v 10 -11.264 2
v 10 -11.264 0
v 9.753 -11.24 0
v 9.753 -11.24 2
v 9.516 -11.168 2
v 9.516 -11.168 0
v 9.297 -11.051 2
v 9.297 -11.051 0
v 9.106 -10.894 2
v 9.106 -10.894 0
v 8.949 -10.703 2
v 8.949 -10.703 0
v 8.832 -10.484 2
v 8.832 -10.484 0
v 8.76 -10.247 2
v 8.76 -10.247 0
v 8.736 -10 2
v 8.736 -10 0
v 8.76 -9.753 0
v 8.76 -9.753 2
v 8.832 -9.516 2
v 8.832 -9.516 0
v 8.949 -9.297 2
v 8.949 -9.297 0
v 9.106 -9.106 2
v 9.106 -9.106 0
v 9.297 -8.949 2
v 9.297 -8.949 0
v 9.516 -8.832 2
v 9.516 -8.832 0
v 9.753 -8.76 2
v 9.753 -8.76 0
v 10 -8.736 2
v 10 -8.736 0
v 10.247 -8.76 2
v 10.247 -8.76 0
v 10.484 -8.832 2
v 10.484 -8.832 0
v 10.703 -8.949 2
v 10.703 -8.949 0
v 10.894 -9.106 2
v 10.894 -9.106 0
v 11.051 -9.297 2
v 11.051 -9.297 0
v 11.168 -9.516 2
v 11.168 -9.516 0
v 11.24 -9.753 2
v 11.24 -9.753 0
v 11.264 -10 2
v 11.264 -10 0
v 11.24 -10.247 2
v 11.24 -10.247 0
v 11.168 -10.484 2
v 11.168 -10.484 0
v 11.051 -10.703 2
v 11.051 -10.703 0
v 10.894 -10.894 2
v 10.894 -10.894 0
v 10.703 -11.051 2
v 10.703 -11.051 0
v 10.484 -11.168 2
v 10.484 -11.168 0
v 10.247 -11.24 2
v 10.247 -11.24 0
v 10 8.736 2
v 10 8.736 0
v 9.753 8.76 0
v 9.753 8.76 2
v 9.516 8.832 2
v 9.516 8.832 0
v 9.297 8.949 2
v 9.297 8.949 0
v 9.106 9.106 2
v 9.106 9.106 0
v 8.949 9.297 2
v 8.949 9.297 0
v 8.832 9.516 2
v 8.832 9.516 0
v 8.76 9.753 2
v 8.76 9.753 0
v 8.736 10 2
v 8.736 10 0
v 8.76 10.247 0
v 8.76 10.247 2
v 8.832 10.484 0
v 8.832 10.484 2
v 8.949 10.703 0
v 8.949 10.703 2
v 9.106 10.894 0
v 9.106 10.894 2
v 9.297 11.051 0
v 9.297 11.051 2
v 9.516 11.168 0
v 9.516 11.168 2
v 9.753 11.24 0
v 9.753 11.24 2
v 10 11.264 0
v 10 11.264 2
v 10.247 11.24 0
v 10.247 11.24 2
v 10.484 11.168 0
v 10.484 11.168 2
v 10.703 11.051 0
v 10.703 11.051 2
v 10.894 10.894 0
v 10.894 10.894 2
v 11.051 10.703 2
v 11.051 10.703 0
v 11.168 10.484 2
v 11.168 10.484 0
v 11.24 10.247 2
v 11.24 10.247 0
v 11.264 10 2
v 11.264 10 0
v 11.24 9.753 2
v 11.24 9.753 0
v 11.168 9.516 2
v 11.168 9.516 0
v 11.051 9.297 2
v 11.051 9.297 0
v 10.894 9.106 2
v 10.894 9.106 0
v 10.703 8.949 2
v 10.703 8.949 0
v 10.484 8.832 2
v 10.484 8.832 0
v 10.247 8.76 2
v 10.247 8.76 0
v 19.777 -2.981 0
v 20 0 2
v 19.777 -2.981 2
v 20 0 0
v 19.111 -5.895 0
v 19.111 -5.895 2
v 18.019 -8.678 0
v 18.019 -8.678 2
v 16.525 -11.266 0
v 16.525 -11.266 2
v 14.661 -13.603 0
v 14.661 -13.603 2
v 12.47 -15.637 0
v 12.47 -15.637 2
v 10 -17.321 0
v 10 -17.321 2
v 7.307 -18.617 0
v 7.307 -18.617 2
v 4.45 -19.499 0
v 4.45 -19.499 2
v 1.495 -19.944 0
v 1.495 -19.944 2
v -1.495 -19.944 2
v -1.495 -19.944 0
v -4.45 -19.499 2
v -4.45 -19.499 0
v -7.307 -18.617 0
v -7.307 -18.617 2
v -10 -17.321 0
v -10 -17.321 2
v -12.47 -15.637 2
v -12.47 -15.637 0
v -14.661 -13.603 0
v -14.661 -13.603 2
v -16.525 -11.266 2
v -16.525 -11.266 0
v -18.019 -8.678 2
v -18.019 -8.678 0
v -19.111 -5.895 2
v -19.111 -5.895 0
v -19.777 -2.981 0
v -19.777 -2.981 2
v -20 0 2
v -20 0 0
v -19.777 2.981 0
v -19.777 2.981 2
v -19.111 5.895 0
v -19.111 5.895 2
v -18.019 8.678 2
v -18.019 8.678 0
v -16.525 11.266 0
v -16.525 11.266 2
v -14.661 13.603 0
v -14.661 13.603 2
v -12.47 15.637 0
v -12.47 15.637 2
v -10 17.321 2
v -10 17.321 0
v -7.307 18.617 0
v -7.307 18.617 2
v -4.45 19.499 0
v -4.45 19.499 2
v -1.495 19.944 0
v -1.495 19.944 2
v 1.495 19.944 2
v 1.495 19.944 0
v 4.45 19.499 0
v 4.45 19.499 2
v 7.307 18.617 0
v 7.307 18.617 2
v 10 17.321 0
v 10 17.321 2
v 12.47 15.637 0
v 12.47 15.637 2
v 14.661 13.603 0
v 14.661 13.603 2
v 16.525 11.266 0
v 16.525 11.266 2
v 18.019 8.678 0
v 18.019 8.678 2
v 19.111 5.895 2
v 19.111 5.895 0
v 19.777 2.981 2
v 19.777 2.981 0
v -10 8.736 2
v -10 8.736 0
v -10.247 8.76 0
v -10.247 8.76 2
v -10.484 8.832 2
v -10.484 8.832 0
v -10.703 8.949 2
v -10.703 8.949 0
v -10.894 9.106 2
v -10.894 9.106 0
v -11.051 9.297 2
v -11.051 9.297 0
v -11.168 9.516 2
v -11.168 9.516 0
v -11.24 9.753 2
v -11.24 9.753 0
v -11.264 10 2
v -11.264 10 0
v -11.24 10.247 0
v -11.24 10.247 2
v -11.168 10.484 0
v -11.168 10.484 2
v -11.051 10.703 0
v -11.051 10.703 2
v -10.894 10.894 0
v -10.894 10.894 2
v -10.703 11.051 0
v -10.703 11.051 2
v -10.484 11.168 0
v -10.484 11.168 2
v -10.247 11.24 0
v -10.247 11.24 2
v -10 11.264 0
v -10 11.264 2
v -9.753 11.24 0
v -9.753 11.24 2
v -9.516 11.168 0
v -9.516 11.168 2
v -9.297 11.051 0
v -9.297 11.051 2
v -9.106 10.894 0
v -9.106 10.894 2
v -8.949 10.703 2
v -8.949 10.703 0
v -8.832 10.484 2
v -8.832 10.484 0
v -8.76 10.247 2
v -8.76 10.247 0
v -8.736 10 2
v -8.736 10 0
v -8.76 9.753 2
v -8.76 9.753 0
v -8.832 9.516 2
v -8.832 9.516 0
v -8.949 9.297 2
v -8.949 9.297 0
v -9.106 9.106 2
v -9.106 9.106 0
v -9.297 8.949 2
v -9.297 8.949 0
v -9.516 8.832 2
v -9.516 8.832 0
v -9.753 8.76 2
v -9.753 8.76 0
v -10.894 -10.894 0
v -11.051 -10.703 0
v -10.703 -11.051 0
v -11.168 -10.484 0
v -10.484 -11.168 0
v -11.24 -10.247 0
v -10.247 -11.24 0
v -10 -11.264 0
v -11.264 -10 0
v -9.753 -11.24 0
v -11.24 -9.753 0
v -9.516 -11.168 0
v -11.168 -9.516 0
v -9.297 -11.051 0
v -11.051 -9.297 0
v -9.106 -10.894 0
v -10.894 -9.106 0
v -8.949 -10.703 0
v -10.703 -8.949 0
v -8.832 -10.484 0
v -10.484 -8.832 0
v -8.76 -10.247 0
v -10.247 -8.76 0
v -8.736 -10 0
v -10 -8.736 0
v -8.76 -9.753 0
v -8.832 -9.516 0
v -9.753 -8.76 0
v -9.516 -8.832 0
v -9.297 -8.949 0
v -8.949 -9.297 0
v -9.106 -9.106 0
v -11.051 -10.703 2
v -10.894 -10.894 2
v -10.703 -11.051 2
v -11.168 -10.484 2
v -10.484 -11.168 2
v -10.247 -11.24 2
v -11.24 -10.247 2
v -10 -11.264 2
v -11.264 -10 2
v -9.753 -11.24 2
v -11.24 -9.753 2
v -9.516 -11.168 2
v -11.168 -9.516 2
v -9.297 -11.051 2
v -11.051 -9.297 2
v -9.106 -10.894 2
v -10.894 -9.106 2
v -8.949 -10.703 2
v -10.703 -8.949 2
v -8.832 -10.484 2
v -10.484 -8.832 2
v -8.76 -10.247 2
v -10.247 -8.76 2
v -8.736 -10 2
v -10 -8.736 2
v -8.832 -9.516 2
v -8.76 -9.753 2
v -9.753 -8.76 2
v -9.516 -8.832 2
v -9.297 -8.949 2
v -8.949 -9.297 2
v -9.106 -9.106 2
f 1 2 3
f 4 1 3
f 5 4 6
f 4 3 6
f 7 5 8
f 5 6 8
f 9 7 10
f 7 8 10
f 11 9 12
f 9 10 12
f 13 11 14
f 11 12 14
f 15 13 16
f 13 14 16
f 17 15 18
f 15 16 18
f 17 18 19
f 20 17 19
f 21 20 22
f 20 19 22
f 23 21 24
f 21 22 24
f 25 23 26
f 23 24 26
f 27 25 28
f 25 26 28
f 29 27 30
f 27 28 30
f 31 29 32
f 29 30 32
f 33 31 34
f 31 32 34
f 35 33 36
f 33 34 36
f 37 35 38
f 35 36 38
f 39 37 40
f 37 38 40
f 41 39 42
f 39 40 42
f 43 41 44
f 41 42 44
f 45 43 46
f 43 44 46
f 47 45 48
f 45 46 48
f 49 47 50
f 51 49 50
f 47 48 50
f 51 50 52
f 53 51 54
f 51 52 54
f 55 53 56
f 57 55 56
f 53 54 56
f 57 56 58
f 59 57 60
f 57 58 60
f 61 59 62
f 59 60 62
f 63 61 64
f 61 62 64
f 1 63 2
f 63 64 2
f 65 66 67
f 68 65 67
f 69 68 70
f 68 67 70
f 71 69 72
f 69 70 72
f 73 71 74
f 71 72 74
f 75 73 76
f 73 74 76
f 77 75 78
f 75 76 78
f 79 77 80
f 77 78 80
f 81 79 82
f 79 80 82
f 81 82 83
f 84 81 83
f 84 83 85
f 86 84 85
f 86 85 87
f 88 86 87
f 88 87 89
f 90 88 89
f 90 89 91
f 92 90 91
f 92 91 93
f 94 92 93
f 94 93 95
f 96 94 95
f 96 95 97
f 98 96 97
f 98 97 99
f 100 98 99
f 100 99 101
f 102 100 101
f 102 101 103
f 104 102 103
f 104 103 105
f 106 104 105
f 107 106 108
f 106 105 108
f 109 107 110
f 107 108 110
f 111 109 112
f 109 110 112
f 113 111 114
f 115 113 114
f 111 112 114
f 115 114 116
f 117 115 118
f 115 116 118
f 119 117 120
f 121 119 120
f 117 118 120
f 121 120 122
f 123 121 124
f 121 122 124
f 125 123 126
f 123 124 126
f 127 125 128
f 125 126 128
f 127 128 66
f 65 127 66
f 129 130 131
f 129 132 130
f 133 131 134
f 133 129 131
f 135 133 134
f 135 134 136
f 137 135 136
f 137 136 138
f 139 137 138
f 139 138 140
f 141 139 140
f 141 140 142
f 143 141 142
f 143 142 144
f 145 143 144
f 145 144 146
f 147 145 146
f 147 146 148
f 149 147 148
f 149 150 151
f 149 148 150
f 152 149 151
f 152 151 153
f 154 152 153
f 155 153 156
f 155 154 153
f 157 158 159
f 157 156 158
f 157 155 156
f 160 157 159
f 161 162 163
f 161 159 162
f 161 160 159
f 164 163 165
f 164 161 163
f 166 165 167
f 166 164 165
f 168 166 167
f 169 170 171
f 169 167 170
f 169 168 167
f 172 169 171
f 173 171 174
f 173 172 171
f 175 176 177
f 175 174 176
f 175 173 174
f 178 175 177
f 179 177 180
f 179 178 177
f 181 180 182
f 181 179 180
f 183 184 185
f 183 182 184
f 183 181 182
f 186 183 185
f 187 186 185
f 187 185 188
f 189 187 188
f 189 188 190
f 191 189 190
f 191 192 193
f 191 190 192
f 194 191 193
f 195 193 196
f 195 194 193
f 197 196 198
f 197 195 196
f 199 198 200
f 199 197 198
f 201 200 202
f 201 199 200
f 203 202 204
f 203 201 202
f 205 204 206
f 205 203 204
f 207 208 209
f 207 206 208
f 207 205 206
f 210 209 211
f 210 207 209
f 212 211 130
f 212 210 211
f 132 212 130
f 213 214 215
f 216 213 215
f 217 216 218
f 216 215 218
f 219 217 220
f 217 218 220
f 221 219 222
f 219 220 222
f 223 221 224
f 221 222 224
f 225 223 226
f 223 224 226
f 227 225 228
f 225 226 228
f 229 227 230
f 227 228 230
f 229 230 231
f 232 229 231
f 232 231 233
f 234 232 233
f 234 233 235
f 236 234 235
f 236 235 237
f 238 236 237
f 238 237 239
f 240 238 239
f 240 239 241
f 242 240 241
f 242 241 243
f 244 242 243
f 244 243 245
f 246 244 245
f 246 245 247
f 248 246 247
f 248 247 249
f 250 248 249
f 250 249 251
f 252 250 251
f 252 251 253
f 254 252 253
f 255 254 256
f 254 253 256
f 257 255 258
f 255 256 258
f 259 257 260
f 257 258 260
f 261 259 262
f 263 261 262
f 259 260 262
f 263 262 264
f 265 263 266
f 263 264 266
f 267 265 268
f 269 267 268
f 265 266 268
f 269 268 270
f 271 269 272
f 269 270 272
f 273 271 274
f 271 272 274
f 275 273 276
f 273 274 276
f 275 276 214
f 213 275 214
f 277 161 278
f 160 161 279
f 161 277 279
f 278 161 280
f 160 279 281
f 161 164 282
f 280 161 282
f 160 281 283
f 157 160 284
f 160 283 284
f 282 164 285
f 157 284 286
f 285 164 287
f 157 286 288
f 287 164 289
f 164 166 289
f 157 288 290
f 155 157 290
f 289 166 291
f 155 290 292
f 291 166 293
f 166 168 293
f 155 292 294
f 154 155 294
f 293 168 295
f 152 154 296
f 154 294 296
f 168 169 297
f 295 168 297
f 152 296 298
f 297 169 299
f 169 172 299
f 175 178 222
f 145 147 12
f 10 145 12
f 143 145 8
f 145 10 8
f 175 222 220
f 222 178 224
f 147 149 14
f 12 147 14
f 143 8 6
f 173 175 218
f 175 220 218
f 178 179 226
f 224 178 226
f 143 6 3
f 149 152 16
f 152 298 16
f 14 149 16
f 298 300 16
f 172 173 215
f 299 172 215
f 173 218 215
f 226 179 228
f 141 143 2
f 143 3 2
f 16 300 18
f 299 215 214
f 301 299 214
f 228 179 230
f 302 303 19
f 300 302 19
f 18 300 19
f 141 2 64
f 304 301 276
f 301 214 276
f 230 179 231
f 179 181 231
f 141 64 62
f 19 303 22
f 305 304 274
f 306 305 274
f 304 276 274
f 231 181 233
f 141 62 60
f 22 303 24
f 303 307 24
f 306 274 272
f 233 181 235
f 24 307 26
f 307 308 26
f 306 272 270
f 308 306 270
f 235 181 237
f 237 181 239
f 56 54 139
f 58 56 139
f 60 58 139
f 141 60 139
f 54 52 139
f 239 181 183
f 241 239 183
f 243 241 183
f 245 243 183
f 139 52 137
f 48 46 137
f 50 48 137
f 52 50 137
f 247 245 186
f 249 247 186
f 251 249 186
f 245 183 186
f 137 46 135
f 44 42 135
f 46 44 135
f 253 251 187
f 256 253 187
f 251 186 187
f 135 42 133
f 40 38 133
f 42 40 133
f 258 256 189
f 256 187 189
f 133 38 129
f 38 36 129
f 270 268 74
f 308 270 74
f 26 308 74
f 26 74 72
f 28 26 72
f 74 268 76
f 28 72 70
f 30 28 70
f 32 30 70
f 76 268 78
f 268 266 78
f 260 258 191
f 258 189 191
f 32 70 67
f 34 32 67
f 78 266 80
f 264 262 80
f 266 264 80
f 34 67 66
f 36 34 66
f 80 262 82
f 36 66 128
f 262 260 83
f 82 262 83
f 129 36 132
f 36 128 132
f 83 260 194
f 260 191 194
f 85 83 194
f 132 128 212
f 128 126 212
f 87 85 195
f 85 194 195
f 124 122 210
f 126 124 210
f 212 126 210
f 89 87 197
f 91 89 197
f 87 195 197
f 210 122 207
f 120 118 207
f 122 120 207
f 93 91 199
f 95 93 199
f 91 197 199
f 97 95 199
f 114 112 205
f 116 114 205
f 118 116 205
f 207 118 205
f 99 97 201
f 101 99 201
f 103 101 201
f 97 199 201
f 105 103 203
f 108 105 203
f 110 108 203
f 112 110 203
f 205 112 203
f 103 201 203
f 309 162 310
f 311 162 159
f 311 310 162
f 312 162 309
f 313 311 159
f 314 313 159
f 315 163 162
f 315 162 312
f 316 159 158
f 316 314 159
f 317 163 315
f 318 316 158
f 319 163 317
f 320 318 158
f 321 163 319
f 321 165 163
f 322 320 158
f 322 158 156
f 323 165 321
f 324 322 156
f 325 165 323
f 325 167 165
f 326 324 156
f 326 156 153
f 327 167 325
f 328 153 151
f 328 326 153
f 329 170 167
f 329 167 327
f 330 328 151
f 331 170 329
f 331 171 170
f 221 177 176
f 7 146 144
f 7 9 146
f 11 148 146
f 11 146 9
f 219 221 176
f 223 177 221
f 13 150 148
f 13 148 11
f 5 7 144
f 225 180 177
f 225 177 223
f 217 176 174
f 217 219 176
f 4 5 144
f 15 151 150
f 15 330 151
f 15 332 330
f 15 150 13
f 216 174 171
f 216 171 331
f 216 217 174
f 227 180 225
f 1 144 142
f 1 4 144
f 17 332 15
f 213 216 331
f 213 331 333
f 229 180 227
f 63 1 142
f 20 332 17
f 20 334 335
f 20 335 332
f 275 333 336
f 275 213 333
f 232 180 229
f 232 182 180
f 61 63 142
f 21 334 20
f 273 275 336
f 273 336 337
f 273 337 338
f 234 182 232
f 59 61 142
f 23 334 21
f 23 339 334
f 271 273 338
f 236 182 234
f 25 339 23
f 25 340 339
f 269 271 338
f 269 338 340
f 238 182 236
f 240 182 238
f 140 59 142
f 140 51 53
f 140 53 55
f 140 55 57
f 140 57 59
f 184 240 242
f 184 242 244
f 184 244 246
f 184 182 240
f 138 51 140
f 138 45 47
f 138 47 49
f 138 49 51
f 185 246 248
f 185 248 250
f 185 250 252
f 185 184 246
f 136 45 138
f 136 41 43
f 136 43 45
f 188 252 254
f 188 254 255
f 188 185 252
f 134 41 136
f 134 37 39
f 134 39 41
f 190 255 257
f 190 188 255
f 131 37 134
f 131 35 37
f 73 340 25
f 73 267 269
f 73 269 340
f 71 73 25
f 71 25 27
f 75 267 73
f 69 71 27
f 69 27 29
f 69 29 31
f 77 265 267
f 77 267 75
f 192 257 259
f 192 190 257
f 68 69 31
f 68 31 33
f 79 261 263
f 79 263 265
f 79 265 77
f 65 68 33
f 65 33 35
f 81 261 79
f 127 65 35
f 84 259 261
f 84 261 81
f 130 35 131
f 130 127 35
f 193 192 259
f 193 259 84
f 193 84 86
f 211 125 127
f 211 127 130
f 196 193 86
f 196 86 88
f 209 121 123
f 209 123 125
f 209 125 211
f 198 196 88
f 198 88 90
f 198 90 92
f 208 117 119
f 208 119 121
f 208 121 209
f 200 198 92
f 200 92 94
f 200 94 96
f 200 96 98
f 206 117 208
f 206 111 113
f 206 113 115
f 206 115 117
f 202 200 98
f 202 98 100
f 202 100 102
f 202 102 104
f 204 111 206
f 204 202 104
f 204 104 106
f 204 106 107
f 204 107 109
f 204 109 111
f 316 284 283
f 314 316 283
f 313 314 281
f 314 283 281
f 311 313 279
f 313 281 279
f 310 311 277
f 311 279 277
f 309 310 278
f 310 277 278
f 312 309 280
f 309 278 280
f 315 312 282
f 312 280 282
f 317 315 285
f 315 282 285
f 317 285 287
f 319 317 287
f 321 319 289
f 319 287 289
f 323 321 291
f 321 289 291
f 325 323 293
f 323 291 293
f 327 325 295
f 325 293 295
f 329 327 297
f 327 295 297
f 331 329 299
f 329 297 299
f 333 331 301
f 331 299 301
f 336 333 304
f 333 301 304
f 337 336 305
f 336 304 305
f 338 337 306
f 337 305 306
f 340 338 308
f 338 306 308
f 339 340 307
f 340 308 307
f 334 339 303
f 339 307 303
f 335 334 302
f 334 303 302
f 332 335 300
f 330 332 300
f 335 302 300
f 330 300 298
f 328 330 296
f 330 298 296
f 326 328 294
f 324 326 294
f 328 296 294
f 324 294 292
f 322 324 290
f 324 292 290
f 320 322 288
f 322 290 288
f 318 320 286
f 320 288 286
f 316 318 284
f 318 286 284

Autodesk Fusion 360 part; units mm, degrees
sketch "Sketch1" plane through (0, 0, 0) normal (0, 0, 1) x (1, 0, 0)
  circle A0 centre (0, 0) radius 20
  dimension "d1" = 40
extrude "Extrude1" add sketch "Sketch1" along normal blind 2
sketch "Sketch2" plane through (0, 0, 2) normal (0, 0, 1) x (-1, 0, 0)
  circle A0 centre (0, 0) radius 20
  line L0 (10, -10) -> (-10, -10) construction
  line L1 (-10, -10) -> (-10, 10) construction
  line L2 (-10, 10) -> (10, 10) construction
  line L3 (10, 10) -> (10, -10) construction
  circle A1 centre (10, -10) radius 1.5
  circle A2 centre (-10, -10) radius 1.5
  circle A3 centre (10, 10) radius 1.5
  circle A4 centre (-10, 10) radius 1.5
  dimension "d4" = 10
  dimension "d5" = 10
  dimension "d6" = 3
  dimension "d7" = 3
  dimension "d8" = 3
  dimension "d9" = 3
hole "Hole1" at (-10, -10, 2) at (-10, 10, 2) at (10, 10, 2) at (10, -10, 2) direction (0, 0, -1) diameter 2.529 depth 2 tip angle 118
